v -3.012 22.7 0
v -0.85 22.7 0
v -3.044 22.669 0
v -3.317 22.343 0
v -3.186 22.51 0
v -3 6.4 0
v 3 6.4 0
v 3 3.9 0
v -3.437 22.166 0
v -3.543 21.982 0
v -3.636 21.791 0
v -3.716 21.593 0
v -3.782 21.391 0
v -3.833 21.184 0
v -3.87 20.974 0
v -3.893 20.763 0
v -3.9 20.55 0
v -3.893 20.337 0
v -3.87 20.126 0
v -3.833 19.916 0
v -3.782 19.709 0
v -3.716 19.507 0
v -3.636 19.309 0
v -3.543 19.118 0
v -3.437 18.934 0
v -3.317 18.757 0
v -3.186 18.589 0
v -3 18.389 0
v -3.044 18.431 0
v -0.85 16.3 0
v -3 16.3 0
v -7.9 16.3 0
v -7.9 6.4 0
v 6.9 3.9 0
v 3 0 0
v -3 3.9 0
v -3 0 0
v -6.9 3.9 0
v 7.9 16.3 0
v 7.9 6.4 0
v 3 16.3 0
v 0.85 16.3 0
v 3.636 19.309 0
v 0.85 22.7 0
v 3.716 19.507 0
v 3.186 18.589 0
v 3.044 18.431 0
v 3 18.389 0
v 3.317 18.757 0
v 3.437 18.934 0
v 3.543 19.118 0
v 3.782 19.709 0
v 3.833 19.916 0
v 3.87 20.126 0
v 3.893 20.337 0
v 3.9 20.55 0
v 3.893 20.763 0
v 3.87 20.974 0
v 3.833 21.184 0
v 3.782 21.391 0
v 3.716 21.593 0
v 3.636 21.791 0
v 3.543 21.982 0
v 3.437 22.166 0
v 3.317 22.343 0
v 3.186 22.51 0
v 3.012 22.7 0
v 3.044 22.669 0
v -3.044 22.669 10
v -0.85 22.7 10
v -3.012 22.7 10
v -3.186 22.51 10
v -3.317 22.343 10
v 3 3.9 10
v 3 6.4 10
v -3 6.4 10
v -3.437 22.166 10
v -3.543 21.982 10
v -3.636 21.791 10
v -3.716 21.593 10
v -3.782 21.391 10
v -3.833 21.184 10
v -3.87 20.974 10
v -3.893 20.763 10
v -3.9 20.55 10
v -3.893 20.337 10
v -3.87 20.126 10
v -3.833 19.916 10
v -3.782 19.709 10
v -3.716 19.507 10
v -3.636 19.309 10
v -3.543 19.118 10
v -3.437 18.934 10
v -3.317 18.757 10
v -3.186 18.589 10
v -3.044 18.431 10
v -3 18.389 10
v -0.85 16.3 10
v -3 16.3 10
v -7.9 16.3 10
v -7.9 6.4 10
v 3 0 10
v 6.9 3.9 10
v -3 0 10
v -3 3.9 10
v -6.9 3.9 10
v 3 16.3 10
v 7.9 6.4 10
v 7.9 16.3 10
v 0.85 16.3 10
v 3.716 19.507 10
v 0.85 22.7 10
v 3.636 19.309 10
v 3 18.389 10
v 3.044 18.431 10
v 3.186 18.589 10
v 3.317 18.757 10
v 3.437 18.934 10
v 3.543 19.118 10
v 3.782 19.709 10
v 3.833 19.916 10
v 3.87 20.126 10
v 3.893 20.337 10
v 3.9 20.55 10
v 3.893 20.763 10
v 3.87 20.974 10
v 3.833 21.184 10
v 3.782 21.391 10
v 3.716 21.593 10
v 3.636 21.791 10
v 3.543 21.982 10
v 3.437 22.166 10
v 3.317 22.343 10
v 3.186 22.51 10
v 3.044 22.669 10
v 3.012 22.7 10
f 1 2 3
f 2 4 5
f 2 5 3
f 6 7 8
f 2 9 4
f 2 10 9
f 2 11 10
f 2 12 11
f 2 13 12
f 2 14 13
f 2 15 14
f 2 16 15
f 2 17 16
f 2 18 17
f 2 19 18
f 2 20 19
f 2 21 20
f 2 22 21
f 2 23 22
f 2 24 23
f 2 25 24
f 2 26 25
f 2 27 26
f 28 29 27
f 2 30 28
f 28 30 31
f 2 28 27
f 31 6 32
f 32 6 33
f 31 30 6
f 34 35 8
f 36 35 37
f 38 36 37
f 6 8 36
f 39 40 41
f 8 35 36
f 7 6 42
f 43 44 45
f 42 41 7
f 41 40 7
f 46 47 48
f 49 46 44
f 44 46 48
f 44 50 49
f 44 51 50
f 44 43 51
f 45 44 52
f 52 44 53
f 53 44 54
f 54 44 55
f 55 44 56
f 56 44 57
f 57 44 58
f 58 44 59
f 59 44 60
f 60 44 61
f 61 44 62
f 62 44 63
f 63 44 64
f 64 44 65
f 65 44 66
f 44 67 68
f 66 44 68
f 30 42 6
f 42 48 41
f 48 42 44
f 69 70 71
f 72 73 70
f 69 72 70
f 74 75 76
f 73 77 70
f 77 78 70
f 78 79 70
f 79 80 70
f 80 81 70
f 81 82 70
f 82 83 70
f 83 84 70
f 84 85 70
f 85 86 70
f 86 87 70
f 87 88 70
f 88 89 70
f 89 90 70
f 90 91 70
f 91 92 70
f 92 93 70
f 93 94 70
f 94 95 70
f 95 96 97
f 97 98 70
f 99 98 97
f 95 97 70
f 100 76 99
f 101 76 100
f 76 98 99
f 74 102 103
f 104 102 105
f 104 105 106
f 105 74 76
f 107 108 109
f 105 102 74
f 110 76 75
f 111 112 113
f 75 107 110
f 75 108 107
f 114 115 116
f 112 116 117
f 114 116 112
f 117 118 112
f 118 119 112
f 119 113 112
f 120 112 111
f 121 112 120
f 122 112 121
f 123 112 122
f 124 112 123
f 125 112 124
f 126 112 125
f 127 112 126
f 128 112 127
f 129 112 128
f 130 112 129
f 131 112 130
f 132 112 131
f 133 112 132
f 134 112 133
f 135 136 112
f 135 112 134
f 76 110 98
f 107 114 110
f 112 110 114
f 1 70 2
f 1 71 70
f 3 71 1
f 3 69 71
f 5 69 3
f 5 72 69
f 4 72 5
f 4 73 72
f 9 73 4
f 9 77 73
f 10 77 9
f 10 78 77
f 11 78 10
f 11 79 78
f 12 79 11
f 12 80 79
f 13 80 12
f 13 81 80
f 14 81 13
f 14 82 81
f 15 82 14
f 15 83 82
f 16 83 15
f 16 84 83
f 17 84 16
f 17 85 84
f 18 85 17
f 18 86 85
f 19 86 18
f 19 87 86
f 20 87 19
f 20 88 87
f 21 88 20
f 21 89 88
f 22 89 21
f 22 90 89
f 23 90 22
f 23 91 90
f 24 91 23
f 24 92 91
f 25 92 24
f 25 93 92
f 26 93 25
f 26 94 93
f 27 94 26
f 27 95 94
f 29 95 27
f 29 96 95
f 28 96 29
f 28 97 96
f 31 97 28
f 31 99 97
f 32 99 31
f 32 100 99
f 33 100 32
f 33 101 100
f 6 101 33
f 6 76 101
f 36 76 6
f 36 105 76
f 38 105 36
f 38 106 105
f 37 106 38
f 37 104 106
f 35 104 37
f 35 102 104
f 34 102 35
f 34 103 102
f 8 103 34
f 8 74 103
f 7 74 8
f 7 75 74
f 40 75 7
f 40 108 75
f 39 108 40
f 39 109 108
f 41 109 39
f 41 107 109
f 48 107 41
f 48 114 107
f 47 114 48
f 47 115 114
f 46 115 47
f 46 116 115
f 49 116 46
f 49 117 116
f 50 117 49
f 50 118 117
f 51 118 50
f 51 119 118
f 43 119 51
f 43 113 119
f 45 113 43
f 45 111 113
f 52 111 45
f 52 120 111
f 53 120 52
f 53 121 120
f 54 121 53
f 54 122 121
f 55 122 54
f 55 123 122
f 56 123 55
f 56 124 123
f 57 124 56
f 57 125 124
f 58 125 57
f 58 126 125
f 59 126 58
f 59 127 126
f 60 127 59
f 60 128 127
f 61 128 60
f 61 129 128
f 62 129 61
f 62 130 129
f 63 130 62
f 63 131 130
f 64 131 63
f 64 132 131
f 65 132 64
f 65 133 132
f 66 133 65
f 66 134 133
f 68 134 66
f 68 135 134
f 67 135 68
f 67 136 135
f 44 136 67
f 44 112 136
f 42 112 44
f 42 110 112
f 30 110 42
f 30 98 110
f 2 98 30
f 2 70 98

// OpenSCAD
$fa=4; // default minimum facet angle is now 0.5
$fs=0.05; // default minimum facet size is now 0.05 mm
tolerance = .1;

tabWidth = tol(2.25);
slotGap = tol(2.4, -1);
slotDepth = tol(4);
spacerWidth = tol(5);
spacerThickness = tol(10);
detentWidth = tol(1);
detentGap = tol(1.6, -1);
totalThickness = 10;
totalLen = (2 * slotDepth) + (2 * slotGap) + spacerThickness;


linear_extrude(totalThickness) for (i = [0, 1]) mirror([i, 0, 0]) {
  translate ([detentGap / 2, 0]) union() {
    translate([detentGap / -2, 0]) square([detentGap / 2, slotDepth + slotGap + spacerThickness]);
    square([tabWidth, totalLen]);
    translate([tabWidth, slotDepth + slotGap]) square([spacerWidth, spacerThickness]);
    polygon([
      [tabWidth, 0],
      [tabWidth, slotDepth],
      [tabWidth + slotDepth, slotDepth]
    ]);
    difference() {
      translate([0, totalLen - tabWidth]) circle(tabWidth + detentWidth);
      translate([-5, totalLen]) square([20, 20]);
      translate([-20, totalLen - 19]) square([20, 20]);
    }
  }
}


function tol(value, m = 1) = value - (m * tolerance);
